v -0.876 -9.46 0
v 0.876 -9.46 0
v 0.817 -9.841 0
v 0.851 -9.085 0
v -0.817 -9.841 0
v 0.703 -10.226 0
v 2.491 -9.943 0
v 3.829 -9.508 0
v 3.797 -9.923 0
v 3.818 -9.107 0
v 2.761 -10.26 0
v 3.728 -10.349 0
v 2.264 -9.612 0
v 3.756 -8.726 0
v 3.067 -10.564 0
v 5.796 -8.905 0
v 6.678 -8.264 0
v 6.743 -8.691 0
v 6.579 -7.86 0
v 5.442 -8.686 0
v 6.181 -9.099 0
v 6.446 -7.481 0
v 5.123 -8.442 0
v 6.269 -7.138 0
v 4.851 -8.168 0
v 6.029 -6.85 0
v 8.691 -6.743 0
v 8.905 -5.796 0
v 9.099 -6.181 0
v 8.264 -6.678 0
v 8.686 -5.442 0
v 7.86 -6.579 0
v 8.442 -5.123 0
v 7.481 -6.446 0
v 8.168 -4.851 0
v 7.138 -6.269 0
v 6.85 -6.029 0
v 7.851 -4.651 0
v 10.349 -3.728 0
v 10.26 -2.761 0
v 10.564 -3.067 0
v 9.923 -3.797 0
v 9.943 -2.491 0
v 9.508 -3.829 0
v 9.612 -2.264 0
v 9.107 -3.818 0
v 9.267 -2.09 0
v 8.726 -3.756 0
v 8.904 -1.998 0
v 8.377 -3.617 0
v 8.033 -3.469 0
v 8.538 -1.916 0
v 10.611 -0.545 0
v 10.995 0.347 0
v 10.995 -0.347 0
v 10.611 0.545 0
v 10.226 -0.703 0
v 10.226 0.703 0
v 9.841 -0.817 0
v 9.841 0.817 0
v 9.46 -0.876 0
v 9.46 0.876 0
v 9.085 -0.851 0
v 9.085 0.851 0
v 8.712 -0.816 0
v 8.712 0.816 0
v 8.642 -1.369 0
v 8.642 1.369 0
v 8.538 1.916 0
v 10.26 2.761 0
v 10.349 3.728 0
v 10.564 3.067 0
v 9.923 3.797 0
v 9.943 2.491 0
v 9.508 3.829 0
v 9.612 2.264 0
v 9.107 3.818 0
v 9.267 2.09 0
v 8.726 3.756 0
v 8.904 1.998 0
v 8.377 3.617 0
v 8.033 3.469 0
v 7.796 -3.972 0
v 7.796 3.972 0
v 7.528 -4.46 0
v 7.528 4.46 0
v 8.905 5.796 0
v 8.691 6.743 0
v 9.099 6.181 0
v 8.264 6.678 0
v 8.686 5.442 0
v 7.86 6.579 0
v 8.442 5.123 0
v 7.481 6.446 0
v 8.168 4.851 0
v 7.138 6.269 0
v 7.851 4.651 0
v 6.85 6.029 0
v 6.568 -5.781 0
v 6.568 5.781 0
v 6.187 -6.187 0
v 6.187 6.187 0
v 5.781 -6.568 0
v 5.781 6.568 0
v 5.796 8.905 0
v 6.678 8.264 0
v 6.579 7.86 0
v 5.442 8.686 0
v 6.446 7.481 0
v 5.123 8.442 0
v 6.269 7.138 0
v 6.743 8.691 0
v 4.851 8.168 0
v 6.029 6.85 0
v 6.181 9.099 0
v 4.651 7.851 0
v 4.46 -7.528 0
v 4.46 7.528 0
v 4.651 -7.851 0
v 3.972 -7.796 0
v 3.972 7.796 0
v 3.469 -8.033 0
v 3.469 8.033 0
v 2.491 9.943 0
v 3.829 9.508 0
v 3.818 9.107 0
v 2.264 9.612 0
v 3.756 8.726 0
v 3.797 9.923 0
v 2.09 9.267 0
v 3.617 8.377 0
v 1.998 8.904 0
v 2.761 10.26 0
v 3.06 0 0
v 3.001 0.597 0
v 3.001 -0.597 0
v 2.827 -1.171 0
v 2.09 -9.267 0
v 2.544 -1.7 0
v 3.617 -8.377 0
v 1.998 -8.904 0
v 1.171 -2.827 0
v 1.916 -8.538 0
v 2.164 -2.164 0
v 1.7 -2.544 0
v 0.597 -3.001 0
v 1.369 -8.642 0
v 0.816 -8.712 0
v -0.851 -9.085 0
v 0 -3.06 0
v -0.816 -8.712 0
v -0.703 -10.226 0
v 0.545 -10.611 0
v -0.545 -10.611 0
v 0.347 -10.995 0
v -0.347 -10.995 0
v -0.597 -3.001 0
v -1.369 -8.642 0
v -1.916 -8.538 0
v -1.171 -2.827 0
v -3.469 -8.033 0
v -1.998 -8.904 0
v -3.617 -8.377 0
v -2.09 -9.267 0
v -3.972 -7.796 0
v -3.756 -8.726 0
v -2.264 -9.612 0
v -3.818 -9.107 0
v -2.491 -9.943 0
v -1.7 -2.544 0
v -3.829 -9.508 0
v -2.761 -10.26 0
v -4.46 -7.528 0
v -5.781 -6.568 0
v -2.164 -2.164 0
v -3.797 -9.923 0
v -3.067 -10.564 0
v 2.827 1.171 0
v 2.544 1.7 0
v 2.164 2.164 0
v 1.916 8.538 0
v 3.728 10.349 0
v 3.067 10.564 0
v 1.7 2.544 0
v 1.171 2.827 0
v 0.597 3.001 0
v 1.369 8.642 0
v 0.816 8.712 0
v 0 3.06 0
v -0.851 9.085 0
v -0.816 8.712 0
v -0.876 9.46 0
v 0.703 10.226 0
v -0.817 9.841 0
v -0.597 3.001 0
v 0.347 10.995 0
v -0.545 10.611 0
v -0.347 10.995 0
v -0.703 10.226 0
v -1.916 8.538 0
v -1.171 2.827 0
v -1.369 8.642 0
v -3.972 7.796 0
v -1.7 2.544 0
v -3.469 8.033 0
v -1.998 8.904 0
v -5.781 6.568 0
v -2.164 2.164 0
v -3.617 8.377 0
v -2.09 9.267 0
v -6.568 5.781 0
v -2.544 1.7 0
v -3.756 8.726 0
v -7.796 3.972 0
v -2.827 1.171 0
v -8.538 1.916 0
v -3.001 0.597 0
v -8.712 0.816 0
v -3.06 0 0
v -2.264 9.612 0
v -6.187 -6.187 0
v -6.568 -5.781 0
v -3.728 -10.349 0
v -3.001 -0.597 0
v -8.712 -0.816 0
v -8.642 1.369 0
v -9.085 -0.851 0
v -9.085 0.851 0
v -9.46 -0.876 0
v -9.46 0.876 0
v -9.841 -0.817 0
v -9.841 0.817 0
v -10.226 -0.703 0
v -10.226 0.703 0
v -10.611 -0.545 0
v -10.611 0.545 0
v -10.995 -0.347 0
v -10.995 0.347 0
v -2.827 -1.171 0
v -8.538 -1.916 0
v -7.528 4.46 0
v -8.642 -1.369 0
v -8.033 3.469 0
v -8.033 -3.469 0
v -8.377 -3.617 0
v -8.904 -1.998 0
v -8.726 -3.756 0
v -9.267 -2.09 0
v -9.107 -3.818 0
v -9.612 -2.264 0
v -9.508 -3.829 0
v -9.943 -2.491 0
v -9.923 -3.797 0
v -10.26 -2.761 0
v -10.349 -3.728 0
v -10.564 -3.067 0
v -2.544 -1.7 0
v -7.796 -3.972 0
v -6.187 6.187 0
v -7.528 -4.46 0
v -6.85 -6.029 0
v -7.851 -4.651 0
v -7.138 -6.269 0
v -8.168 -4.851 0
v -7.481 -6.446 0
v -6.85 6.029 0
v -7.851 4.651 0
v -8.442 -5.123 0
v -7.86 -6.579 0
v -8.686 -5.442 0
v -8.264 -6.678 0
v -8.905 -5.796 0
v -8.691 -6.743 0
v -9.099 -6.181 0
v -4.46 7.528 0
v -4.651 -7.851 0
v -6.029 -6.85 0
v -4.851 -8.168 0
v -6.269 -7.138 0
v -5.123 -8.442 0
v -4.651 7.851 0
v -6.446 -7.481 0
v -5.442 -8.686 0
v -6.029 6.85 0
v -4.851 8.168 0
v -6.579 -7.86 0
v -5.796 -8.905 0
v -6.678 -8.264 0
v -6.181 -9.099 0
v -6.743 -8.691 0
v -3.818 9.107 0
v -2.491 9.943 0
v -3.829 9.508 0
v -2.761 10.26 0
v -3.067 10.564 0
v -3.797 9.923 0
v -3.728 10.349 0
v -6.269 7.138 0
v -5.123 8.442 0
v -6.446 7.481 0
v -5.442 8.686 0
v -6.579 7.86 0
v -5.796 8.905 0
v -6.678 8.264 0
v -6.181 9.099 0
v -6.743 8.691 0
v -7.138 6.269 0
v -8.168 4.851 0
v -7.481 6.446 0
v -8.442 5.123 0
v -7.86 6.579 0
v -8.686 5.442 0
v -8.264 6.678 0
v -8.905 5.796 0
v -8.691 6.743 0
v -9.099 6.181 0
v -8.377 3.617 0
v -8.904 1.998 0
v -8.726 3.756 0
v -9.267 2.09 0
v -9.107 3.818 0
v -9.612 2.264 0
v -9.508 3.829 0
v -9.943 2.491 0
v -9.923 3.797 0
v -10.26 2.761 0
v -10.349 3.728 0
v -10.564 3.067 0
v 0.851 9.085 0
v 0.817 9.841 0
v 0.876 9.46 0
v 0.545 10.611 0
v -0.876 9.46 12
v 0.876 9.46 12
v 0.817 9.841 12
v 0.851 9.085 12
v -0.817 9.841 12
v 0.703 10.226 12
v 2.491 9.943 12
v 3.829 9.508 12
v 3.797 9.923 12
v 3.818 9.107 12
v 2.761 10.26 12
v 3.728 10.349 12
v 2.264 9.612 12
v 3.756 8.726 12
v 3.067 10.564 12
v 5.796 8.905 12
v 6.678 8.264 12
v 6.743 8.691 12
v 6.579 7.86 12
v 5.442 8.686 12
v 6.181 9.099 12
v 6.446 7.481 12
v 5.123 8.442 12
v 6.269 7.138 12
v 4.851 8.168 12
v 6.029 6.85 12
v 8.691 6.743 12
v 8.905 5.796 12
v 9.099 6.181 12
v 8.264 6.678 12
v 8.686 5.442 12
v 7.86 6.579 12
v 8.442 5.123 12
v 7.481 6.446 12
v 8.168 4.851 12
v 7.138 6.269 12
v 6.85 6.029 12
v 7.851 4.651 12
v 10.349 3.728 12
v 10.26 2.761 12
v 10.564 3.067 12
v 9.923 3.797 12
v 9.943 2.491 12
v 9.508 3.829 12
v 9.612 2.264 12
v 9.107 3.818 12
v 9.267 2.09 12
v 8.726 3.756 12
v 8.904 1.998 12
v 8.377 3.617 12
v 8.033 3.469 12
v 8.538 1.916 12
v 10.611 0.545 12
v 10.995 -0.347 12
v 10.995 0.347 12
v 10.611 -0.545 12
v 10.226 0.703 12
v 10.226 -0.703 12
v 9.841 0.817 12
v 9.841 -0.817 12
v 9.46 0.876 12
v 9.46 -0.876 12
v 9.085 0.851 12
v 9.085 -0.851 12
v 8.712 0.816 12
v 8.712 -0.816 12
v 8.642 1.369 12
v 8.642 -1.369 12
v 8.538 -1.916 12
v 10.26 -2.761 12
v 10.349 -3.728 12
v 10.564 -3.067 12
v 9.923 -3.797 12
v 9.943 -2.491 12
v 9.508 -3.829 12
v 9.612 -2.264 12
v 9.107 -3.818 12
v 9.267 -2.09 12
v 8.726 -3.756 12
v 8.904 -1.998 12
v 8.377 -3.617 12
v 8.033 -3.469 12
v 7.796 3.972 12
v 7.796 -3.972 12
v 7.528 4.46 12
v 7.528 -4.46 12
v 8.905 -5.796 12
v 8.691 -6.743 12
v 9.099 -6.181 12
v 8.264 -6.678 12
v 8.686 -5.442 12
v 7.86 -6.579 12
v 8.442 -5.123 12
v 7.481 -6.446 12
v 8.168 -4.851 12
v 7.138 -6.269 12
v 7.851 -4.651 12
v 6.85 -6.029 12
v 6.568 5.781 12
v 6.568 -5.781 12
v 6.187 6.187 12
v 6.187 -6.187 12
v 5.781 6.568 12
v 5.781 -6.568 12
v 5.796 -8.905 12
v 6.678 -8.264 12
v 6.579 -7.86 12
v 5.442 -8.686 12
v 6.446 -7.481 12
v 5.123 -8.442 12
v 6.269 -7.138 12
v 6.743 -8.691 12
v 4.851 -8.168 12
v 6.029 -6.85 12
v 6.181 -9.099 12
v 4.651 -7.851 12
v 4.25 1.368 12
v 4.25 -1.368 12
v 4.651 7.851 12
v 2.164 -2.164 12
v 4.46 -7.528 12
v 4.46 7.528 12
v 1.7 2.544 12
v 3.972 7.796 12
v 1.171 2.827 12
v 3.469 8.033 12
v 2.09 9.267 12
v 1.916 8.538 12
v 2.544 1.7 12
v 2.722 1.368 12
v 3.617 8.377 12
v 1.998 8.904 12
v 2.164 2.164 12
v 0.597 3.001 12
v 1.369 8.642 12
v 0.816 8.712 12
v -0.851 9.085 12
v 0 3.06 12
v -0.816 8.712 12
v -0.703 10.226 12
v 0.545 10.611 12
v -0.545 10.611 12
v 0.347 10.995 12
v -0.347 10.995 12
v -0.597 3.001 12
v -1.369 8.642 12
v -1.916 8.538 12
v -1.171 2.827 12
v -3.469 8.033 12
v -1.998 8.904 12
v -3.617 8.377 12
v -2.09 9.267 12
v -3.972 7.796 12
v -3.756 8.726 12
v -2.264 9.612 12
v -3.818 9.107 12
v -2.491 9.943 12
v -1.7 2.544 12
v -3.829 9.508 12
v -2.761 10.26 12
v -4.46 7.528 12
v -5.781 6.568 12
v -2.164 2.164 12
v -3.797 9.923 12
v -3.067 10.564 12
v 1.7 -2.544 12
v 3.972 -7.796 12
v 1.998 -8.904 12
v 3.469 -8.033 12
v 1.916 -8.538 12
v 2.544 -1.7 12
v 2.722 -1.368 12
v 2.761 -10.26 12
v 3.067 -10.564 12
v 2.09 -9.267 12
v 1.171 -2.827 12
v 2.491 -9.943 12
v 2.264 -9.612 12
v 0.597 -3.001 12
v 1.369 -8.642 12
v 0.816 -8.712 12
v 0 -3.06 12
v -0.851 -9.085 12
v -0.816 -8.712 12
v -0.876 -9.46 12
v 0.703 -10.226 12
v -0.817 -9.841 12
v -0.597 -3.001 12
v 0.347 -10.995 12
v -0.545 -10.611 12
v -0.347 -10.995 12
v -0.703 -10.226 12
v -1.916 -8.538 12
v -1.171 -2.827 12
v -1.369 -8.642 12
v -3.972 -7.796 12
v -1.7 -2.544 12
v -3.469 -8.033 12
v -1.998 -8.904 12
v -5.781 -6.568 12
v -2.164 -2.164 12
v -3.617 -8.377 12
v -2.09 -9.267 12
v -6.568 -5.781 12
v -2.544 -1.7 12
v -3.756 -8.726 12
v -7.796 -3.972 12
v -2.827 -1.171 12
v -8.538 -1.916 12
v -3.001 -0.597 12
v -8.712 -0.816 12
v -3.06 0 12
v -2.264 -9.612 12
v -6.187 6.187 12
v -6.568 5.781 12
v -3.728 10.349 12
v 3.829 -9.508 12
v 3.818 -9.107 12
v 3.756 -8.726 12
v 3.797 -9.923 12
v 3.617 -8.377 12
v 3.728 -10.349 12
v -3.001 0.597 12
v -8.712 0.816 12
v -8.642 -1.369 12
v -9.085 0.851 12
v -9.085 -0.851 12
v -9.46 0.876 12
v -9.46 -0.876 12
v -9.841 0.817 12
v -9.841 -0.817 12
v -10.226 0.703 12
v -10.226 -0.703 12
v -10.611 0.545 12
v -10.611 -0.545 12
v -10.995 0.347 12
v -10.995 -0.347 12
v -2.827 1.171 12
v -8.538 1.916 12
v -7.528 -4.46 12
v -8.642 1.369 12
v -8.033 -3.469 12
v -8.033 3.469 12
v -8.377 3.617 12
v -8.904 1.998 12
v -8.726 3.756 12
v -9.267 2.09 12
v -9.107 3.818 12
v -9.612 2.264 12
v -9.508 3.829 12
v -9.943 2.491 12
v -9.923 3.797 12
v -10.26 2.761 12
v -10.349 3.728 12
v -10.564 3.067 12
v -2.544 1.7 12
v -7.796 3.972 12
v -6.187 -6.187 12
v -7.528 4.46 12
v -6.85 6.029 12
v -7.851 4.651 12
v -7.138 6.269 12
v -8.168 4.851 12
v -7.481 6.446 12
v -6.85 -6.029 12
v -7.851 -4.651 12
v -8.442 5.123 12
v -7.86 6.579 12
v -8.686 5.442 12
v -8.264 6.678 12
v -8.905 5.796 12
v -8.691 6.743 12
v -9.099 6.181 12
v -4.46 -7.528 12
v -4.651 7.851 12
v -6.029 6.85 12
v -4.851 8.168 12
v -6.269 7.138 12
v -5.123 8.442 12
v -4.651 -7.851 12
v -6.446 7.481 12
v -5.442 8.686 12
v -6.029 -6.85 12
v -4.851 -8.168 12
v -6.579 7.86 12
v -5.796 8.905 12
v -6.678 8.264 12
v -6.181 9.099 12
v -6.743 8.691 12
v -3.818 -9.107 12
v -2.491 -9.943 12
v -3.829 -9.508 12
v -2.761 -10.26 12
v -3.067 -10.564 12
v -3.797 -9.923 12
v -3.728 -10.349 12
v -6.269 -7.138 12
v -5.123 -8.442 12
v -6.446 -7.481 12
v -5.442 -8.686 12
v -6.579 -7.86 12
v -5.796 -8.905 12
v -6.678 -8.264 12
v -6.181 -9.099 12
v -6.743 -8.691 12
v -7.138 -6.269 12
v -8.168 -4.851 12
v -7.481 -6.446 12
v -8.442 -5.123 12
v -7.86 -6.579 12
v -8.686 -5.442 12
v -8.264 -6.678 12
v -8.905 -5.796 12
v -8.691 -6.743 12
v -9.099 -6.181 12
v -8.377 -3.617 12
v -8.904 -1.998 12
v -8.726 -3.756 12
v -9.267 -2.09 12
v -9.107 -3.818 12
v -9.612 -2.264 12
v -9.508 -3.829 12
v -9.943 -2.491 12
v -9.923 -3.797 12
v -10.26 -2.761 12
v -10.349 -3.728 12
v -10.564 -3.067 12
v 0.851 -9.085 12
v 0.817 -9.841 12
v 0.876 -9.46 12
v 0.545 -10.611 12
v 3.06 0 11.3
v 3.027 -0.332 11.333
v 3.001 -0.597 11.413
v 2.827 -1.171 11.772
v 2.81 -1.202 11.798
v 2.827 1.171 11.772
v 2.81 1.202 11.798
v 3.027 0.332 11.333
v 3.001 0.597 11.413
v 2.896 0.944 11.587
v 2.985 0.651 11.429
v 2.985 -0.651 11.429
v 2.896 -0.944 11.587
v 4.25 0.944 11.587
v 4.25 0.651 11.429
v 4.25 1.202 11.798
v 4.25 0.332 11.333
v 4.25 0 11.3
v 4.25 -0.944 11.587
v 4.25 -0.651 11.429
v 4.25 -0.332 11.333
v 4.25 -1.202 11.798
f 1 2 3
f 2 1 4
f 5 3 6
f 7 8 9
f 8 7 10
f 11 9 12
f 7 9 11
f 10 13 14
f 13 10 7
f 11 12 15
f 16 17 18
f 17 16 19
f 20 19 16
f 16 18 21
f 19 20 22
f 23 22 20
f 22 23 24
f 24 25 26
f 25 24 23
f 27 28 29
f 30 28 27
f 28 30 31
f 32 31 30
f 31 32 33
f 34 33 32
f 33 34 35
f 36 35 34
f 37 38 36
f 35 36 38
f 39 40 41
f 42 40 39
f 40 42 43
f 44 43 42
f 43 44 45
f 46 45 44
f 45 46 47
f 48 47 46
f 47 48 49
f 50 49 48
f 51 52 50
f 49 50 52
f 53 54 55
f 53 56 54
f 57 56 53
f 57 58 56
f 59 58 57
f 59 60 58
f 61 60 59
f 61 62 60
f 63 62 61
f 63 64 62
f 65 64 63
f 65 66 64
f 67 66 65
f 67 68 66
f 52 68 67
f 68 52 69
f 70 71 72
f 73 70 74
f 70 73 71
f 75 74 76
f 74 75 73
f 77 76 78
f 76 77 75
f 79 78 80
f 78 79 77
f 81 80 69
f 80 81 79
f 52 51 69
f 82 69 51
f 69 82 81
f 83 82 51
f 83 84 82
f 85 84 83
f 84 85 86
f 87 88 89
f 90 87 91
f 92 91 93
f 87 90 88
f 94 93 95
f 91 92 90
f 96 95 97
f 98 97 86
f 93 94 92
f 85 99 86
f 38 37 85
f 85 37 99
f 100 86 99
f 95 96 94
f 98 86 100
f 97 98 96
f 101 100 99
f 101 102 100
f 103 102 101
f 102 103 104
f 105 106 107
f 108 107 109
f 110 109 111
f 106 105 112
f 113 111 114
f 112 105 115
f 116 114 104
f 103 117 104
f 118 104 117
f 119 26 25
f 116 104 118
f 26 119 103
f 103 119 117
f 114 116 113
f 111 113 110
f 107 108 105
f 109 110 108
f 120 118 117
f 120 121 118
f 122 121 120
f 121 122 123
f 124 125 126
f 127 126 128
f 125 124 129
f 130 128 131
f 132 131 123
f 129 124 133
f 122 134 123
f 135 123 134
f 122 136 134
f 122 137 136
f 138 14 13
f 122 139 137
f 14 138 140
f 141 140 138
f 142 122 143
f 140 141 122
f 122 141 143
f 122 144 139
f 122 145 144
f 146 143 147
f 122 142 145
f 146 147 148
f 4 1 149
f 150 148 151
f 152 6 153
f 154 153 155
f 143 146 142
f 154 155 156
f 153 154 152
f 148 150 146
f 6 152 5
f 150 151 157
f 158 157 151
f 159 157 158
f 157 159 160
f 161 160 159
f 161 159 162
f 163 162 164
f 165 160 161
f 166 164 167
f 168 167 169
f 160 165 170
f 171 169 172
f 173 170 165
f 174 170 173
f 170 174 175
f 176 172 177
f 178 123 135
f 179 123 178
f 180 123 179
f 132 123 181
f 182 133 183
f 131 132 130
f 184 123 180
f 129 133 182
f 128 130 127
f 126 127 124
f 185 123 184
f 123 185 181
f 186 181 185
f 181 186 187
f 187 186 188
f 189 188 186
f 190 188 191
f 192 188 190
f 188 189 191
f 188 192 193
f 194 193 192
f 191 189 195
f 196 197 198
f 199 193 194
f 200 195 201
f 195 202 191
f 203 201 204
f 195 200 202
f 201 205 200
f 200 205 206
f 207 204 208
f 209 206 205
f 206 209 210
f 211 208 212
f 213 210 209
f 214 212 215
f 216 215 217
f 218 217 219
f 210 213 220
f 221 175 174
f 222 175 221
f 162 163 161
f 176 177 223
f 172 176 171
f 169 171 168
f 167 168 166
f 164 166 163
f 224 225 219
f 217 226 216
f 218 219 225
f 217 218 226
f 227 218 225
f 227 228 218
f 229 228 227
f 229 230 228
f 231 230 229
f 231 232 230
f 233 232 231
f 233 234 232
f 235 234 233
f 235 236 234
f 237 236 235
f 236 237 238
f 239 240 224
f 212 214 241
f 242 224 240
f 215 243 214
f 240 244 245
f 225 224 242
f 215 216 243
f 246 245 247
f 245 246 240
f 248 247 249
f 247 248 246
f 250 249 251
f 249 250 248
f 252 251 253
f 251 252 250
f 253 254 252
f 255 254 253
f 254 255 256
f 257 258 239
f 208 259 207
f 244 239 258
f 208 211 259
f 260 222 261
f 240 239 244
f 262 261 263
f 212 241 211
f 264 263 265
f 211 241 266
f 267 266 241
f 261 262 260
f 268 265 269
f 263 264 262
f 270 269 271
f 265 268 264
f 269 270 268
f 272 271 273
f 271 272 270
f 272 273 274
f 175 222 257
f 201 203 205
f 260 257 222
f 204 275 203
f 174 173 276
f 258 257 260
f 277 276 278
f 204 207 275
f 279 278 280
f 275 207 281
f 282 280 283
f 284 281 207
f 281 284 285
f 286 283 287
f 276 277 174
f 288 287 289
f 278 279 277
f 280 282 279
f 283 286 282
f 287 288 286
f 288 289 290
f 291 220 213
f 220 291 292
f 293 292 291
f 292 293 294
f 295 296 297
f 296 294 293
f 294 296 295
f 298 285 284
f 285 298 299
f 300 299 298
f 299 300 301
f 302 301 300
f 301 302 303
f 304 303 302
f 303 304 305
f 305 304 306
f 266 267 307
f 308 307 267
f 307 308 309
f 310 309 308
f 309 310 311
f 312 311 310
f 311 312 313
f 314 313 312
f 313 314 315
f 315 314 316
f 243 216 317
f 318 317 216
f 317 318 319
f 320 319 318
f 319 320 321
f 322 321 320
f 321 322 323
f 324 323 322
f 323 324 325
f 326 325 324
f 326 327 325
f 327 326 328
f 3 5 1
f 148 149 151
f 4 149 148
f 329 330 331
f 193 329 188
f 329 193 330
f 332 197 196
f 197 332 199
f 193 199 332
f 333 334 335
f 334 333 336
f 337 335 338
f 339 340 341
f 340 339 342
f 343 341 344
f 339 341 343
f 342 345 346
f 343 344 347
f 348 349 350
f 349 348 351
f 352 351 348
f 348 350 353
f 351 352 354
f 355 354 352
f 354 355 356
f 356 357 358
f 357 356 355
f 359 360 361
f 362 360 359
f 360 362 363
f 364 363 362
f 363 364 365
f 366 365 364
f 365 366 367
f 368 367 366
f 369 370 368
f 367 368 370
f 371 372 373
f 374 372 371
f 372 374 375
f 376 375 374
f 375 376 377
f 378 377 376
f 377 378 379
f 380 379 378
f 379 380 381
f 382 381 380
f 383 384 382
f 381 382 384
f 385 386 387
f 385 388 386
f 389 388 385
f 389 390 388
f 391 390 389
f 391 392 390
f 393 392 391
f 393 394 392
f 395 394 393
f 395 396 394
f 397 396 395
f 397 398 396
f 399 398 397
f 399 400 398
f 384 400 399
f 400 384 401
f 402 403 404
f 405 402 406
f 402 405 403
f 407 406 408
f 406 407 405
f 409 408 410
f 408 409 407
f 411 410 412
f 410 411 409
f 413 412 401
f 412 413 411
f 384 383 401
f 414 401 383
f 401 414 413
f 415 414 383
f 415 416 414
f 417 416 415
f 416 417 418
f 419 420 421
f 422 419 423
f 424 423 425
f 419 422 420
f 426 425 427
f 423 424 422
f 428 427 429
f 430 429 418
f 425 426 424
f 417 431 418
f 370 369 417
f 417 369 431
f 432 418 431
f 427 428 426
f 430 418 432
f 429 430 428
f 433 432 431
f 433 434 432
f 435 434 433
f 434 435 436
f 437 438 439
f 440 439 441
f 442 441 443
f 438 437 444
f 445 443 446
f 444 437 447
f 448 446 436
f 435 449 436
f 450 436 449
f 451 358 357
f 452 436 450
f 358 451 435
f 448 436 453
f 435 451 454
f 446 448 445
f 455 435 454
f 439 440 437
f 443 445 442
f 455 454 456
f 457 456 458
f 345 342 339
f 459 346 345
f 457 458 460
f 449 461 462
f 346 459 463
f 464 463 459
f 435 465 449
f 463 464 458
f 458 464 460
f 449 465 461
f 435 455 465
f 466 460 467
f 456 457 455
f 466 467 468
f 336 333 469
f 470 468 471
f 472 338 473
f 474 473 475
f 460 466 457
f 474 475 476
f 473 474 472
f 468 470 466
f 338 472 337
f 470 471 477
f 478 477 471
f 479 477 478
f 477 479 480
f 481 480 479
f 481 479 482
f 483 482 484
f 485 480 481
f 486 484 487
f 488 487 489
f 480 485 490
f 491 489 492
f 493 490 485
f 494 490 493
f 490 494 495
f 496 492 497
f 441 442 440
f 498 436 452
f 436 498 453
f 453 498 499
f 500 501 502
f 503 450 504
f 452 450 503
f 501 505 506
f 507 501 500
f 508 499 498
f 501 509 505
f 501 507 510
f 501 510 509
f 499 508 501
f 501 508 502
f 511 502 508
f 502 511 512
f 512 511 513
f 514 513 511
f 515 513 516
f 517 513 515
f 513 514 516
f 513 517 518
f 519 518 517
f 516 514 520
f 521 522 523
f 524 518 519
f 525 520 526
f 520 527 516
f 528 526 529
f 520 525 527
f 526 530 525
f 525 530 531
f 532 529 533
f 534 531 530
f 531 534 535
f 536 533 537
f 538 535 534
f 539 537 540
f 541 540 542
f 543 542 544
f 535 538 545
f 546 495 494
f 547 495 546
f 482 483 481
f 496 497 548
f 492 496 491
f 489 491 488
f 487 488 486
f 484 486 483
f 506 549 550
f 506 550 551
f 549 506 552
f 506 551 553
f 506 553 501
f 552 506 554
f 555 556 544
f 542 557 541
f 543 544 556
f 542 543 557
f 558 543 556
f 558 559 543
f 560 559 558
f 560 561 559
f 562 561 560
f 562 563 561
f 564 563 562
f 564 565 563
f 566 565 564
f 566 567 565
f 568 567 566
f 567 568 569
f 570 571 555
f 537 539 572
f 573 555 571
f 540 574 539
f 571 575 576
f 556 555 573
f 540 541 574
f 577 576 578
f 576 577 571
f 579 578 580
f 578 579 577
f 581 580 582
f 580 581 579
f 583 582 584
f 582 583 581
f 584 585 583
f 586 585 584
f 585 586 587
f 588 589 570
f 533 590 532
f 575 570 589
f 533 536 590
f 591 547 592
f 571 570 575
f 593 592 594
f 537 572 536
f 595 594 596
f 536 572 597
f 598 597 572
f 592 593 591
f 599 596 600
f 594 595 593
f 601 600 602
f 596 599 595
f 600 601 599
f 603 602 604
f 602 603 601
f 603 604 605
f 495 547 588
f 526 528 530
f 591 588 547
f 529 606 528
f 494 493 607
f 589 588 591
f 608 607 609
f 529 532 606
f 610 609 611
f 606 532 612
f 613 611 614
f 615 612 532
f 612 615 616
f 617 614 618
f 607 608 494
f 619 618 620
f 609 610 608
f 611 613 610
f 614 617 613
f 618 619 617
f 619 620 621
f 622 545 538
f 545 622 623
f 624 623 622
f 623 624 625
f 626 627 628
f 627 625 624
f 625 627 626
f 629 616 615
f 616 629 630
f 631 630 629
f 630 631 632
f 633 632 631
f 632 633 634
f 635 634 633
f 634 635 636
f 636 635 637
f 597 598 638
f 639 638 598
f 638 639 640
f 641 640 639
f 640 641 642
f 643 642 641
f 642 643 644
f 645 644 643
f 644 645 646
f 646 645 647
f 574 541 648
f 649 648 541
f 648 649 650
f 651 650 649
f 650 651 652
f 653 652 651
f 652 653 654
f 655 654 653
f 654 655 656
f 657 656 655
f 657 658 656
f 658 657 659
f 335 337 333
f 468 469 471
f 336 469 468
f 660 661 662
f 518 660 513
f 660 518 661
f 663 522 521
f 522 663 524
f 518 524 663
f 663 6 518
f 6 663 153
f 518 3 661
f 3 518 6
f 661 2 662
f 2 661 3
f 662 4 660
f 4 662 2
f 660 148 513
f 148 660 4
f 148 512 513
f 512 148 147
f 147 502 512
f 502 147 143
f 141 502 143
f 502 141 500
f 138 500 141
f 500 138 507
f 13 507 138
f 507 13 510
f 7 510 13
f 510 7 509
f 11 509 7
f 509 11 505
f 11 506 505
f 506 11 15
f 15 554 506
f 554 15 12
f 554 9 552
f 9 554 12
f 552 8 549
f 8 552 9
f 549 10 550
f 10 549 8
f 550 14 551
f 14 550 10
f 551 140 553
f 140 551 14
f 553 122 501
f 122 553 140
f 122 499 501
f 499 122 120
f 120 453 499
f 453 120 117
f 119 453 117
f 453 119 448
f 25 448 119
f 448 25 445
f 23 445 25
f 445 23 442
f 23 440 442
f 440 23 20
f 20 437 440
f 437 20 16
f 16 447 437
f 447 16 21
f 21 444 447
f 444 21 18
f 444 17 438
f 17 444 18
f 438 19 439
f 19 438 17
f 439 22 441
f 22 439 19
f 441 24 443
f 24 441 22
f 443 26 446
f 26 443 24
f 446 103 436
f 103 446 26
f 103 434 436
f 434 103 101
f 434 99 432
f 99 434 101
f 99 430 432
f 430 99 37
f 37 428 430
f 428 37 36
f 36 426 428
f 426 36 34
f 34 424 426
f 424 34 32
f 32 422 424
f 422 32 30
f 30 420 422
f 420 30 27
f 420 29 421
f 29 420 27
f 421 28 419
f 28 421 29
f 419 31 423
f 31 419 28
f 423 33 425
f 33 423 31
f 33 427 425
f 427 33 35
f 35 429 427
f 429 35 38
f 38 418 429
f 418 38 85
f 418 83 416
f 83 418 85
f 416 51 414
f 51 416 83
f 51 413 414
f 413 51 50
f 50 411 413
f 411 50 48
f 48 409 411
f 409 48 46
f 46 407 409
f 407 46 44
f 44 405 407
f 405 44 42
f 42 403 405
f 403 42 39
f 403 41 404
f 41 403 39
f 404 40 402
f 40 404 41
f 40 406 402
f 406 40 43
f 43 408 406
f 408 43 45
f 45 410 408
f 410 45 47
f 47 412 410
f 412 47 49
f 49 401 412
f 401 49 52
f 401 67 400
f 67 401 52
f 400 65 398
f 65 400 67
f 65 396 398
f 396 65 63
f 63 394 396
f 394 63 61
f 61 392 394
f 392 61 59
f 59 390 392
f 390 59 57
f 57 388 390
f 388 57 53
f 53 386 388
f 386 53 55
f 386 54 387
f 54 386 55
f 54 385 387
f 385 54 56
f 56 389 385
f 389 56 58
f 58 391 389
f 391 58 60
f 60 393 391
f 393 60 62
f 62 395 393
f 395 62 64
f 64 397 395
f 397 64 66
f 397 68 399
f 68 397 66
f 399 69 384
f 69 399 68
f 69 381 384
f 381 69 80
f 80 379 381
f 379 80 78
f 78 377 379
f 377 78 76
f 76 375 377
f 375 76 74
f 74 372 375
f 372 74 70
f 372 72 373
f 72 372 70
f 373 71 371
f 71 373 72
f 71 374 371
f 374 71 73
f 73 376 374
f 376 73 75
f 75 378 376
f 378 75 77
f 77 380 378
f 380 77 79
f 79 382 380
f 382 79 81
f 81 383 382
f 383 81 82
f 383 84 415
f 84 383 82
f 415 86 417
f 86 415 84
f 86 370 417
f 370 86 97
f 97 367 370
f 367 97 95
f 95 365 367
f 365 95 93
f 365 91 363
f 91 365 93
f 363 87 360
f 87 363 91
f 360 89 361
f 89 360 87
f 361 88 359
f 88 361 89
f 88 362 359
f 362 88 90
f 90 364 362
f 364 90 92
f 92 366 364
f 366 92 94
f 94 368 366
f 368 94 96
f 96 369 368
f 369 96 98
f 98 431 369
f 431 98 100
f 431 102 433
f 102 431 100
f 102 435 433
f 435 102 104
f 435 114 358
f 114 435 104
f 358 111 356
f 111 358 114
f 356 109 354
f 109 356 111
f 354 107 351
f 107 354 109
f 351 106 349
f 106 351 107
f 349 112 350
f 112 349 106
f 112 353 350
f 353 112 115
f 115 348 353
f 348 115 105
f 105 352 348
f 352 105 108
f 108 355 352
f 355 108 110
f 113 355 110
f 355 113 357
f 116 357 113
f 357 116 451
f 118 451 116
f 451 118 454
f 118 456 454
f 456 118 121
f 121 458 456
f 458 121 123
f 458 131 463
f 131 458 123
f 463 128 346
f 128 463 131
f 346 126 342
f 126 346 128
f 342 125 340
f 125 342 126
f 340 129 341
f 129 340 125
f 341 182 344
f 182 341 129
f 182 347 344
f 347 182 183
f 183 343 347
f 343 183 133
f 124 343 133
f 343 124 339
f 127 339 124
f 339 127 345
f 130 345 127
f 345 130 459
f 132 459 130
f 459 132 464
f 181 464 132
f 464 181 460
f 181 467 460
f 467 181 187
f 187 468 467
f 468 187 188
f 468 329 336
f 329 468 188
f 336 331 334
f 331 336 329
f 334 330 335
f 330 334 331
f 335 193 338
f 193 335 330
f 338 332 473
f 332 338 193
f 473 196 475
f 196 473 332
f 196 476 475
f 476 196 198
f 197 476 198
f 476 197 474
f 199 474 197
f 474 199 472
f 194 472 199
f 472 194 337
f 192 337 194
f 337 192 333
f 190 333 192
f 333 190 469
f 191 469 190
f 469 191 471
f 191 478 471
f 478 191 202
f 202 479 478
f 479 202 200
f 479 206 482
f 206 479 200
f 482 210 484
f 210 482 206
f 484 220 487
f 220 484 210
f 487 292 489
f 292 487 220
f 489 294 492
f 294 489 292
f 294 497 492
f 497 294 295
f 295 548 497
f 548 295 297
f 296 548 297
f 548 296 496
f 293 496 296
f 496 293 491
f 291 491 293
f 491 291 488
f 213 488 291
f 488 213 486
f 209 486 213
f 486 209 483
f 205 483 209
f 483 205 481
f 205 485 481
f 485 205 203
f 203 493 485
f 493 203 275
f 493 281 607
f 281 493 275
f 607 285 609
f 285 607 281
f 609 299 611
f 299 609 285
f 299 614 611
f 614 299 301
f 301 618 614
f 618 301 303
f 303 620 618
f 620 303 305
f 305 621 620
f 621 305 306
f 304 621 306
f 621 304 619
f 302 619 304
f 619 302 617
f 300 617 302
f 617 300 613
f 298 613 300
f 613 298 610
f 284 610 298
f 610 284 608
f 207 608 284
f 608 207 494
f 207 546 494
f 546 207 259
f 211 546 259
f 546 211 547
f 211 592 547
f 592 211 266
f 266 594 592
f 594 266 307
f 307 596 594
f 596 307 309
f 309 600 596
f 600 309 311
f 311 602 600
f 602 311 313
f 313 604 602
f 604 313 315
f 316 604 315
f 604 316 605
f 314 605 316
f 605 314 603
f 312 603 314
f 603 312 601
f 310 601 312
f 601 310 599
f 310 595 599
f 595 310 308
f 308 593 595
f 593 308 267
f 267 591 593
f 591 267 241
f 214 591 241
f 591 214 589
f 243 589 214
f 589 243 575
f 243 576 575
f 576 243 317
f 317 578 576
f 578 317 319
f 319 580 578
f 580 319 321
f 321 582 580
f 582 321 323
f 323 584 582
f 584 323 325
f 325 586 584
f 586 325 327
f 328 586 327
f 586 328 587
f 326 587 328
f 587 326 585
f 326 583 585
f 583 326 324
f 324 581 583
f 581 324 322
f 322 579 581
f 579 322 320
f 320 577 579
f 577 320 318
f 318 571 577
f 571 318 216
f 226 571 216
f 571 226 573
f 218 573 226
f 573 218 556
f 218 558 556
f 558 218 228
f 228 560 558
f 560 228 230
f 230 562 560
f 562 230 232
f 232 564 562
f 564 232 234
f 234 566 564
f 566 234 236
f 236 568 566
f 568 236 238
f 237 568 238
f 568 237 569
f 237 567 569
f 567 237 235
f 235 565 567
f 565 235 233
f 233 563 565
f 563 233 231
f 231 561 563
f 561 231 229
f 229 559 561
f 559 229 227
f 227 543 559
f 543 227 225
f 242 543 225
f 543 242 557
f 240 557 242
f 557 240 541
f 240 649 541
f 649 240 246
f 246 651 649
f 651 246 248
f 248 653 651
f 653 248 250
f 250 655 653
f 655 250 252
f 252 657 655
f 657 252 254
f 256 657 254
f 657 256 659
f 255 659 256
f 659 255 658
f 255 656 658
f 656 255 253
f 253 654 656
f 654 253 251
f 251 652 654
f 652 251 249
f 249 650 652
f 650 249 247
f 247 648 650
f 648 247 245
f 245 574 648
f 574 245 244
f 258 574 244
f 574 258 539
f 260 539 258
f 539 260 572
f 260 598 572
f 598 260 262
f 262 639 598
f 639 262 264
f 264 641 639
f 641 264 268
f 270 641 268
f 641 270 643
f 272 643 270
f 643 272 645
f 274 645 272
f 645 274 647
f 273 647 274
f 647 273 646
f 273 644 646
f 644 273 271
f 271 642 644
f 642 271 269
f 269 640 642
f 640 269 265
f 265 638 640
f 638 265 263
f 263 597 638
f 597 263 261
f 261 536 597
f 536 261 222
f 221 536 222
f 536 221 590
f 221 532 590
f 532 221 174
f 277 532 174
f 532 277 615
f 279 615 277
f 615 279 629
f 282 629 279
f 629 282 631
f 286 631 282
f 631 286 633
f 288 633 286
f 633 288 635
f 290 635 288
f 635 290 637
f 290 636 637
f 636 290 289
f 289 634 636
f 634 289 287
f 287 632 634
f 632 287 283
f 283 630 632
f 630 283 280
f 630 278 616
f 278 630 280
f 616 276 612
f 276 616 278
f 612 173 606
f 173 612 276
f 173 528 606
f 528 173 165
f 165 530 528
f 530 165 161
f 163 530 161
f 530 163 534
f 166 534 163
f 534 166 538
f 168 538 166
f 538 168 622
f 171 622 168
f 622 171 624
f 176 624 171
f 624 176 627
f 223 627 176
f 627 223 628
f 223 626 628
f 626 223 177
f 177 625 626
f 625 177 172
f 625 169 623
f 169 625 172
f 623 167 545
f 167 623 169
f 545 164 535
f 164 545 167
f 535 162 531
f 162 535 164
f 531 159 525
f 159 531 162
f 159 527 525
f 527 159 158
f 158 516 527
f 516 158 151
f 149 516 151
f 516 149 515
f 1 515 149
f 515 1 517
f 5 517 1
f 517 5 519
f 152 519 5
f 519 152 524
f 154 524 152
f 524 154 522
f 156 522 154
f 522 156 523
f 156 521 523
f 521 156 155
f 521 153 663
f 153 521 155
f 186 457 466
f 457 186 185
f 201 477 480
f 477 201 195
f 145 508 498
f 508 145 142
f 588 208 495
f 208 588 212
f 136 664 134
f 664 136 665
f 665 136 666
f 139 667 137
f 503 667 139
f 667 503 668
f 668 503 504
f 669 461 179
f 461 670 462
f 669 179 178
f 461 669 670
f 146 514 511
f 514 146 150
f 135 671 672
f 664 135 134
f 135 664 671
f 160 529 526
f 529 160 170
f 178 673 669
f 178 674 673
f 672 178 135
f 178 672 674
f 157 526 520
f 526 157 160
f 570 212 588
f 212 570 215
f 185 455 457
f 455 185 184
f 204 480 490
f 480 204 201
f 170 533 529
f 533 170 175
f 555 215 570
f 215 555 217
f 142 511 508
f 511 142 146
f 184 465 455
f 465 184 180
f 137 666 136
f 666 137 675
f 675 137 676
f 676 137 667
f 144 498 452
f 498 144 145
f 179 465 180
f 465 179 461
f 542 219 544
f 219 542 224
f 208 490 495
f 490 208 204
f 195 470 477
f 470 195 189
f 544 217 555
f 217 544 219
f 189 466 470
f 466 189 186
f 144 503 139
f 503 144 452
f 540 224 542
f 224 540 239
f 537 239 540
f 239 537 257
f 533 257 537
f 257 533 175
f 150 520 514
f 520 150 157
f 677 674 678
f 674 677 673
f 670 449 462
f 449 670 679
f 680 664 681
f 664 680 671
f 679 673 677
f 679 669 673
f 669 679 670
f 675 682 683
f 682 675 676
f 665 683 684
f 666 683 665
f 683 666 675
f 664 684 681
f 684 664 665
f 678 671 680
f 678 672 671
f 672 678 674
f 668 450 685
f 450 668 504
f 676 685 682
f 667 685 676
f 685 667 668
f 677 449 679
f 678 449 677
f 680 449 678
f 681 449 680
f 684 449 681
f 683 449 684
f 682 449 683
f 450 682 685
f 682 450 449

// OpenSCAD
$fn = 32;

// ----------------------------------------------------------------------
// Spur gear: m=1 z=20, 22 mm tip diameter x 12 mm
// ----------------------------------------------------------------------

// --- parameters (mm) ---
module_m = 1;             // module
teeth = 20;               // number of teeth
face_w = 12;              // face width
pa = 20;                  // pressure angle, deg
bore_d = 6.12;            // shaft bore
set_d = 3.4;              // set screw tap hole
set_z = 13;               // set screw height

/* --- involute profile --- */
pitch_r = module_m * teeth / 2;
base_r = pitch_r * cos(pa);
tip_r = pitch_r + module_m;
root_r = pitch_r - 1.25 * module_m;
flank_steps = 6;

function inv_deg(a) = (tan(a) - a * PI / 180) * 180 / PI;
function flank_r(i) = root_r + (tip_r - root_r) * i / flank_steps;
function half_angle(r) = 90 / teeth + inv_deg(pa) - inv_deg(acos(min(1, base_r / r)));
function tooth_pt(k, i, side) =
    let (r = flank_r(i), a = k * 360 / teeth + side * half_angle(r))
    [r * cos(a), r * sin(a)];

module tooth_profile() {
  polygon(points = [
    for (k = [0 : teeth - 1])
      each [
        for (i = [0 : flank_steps]) tooth_pt(k, i, -1),
        for (i = [flank_steps : -1 : 0]) tooth_pt(k, i, 1),
        let (ta = (k + 0.5) * 360 / teeth)
          [root_r * cos(ta), root_r * sin(ta)]
      ]
  ]);
}

module gear_disc() {
  linear_extrude(height = face_w) tooth_profile();
}

difference() {
  gear_disc();
  translate([0, 0, -1]) cylinder(h = face_w + 3, d = bore_d);
  /* set screw, drilled radially */
  translate([-1, 0, set_z]) rotate([0, 90, 0]) cylinder(h = (root_r * 0.6), d = set_d);
}
